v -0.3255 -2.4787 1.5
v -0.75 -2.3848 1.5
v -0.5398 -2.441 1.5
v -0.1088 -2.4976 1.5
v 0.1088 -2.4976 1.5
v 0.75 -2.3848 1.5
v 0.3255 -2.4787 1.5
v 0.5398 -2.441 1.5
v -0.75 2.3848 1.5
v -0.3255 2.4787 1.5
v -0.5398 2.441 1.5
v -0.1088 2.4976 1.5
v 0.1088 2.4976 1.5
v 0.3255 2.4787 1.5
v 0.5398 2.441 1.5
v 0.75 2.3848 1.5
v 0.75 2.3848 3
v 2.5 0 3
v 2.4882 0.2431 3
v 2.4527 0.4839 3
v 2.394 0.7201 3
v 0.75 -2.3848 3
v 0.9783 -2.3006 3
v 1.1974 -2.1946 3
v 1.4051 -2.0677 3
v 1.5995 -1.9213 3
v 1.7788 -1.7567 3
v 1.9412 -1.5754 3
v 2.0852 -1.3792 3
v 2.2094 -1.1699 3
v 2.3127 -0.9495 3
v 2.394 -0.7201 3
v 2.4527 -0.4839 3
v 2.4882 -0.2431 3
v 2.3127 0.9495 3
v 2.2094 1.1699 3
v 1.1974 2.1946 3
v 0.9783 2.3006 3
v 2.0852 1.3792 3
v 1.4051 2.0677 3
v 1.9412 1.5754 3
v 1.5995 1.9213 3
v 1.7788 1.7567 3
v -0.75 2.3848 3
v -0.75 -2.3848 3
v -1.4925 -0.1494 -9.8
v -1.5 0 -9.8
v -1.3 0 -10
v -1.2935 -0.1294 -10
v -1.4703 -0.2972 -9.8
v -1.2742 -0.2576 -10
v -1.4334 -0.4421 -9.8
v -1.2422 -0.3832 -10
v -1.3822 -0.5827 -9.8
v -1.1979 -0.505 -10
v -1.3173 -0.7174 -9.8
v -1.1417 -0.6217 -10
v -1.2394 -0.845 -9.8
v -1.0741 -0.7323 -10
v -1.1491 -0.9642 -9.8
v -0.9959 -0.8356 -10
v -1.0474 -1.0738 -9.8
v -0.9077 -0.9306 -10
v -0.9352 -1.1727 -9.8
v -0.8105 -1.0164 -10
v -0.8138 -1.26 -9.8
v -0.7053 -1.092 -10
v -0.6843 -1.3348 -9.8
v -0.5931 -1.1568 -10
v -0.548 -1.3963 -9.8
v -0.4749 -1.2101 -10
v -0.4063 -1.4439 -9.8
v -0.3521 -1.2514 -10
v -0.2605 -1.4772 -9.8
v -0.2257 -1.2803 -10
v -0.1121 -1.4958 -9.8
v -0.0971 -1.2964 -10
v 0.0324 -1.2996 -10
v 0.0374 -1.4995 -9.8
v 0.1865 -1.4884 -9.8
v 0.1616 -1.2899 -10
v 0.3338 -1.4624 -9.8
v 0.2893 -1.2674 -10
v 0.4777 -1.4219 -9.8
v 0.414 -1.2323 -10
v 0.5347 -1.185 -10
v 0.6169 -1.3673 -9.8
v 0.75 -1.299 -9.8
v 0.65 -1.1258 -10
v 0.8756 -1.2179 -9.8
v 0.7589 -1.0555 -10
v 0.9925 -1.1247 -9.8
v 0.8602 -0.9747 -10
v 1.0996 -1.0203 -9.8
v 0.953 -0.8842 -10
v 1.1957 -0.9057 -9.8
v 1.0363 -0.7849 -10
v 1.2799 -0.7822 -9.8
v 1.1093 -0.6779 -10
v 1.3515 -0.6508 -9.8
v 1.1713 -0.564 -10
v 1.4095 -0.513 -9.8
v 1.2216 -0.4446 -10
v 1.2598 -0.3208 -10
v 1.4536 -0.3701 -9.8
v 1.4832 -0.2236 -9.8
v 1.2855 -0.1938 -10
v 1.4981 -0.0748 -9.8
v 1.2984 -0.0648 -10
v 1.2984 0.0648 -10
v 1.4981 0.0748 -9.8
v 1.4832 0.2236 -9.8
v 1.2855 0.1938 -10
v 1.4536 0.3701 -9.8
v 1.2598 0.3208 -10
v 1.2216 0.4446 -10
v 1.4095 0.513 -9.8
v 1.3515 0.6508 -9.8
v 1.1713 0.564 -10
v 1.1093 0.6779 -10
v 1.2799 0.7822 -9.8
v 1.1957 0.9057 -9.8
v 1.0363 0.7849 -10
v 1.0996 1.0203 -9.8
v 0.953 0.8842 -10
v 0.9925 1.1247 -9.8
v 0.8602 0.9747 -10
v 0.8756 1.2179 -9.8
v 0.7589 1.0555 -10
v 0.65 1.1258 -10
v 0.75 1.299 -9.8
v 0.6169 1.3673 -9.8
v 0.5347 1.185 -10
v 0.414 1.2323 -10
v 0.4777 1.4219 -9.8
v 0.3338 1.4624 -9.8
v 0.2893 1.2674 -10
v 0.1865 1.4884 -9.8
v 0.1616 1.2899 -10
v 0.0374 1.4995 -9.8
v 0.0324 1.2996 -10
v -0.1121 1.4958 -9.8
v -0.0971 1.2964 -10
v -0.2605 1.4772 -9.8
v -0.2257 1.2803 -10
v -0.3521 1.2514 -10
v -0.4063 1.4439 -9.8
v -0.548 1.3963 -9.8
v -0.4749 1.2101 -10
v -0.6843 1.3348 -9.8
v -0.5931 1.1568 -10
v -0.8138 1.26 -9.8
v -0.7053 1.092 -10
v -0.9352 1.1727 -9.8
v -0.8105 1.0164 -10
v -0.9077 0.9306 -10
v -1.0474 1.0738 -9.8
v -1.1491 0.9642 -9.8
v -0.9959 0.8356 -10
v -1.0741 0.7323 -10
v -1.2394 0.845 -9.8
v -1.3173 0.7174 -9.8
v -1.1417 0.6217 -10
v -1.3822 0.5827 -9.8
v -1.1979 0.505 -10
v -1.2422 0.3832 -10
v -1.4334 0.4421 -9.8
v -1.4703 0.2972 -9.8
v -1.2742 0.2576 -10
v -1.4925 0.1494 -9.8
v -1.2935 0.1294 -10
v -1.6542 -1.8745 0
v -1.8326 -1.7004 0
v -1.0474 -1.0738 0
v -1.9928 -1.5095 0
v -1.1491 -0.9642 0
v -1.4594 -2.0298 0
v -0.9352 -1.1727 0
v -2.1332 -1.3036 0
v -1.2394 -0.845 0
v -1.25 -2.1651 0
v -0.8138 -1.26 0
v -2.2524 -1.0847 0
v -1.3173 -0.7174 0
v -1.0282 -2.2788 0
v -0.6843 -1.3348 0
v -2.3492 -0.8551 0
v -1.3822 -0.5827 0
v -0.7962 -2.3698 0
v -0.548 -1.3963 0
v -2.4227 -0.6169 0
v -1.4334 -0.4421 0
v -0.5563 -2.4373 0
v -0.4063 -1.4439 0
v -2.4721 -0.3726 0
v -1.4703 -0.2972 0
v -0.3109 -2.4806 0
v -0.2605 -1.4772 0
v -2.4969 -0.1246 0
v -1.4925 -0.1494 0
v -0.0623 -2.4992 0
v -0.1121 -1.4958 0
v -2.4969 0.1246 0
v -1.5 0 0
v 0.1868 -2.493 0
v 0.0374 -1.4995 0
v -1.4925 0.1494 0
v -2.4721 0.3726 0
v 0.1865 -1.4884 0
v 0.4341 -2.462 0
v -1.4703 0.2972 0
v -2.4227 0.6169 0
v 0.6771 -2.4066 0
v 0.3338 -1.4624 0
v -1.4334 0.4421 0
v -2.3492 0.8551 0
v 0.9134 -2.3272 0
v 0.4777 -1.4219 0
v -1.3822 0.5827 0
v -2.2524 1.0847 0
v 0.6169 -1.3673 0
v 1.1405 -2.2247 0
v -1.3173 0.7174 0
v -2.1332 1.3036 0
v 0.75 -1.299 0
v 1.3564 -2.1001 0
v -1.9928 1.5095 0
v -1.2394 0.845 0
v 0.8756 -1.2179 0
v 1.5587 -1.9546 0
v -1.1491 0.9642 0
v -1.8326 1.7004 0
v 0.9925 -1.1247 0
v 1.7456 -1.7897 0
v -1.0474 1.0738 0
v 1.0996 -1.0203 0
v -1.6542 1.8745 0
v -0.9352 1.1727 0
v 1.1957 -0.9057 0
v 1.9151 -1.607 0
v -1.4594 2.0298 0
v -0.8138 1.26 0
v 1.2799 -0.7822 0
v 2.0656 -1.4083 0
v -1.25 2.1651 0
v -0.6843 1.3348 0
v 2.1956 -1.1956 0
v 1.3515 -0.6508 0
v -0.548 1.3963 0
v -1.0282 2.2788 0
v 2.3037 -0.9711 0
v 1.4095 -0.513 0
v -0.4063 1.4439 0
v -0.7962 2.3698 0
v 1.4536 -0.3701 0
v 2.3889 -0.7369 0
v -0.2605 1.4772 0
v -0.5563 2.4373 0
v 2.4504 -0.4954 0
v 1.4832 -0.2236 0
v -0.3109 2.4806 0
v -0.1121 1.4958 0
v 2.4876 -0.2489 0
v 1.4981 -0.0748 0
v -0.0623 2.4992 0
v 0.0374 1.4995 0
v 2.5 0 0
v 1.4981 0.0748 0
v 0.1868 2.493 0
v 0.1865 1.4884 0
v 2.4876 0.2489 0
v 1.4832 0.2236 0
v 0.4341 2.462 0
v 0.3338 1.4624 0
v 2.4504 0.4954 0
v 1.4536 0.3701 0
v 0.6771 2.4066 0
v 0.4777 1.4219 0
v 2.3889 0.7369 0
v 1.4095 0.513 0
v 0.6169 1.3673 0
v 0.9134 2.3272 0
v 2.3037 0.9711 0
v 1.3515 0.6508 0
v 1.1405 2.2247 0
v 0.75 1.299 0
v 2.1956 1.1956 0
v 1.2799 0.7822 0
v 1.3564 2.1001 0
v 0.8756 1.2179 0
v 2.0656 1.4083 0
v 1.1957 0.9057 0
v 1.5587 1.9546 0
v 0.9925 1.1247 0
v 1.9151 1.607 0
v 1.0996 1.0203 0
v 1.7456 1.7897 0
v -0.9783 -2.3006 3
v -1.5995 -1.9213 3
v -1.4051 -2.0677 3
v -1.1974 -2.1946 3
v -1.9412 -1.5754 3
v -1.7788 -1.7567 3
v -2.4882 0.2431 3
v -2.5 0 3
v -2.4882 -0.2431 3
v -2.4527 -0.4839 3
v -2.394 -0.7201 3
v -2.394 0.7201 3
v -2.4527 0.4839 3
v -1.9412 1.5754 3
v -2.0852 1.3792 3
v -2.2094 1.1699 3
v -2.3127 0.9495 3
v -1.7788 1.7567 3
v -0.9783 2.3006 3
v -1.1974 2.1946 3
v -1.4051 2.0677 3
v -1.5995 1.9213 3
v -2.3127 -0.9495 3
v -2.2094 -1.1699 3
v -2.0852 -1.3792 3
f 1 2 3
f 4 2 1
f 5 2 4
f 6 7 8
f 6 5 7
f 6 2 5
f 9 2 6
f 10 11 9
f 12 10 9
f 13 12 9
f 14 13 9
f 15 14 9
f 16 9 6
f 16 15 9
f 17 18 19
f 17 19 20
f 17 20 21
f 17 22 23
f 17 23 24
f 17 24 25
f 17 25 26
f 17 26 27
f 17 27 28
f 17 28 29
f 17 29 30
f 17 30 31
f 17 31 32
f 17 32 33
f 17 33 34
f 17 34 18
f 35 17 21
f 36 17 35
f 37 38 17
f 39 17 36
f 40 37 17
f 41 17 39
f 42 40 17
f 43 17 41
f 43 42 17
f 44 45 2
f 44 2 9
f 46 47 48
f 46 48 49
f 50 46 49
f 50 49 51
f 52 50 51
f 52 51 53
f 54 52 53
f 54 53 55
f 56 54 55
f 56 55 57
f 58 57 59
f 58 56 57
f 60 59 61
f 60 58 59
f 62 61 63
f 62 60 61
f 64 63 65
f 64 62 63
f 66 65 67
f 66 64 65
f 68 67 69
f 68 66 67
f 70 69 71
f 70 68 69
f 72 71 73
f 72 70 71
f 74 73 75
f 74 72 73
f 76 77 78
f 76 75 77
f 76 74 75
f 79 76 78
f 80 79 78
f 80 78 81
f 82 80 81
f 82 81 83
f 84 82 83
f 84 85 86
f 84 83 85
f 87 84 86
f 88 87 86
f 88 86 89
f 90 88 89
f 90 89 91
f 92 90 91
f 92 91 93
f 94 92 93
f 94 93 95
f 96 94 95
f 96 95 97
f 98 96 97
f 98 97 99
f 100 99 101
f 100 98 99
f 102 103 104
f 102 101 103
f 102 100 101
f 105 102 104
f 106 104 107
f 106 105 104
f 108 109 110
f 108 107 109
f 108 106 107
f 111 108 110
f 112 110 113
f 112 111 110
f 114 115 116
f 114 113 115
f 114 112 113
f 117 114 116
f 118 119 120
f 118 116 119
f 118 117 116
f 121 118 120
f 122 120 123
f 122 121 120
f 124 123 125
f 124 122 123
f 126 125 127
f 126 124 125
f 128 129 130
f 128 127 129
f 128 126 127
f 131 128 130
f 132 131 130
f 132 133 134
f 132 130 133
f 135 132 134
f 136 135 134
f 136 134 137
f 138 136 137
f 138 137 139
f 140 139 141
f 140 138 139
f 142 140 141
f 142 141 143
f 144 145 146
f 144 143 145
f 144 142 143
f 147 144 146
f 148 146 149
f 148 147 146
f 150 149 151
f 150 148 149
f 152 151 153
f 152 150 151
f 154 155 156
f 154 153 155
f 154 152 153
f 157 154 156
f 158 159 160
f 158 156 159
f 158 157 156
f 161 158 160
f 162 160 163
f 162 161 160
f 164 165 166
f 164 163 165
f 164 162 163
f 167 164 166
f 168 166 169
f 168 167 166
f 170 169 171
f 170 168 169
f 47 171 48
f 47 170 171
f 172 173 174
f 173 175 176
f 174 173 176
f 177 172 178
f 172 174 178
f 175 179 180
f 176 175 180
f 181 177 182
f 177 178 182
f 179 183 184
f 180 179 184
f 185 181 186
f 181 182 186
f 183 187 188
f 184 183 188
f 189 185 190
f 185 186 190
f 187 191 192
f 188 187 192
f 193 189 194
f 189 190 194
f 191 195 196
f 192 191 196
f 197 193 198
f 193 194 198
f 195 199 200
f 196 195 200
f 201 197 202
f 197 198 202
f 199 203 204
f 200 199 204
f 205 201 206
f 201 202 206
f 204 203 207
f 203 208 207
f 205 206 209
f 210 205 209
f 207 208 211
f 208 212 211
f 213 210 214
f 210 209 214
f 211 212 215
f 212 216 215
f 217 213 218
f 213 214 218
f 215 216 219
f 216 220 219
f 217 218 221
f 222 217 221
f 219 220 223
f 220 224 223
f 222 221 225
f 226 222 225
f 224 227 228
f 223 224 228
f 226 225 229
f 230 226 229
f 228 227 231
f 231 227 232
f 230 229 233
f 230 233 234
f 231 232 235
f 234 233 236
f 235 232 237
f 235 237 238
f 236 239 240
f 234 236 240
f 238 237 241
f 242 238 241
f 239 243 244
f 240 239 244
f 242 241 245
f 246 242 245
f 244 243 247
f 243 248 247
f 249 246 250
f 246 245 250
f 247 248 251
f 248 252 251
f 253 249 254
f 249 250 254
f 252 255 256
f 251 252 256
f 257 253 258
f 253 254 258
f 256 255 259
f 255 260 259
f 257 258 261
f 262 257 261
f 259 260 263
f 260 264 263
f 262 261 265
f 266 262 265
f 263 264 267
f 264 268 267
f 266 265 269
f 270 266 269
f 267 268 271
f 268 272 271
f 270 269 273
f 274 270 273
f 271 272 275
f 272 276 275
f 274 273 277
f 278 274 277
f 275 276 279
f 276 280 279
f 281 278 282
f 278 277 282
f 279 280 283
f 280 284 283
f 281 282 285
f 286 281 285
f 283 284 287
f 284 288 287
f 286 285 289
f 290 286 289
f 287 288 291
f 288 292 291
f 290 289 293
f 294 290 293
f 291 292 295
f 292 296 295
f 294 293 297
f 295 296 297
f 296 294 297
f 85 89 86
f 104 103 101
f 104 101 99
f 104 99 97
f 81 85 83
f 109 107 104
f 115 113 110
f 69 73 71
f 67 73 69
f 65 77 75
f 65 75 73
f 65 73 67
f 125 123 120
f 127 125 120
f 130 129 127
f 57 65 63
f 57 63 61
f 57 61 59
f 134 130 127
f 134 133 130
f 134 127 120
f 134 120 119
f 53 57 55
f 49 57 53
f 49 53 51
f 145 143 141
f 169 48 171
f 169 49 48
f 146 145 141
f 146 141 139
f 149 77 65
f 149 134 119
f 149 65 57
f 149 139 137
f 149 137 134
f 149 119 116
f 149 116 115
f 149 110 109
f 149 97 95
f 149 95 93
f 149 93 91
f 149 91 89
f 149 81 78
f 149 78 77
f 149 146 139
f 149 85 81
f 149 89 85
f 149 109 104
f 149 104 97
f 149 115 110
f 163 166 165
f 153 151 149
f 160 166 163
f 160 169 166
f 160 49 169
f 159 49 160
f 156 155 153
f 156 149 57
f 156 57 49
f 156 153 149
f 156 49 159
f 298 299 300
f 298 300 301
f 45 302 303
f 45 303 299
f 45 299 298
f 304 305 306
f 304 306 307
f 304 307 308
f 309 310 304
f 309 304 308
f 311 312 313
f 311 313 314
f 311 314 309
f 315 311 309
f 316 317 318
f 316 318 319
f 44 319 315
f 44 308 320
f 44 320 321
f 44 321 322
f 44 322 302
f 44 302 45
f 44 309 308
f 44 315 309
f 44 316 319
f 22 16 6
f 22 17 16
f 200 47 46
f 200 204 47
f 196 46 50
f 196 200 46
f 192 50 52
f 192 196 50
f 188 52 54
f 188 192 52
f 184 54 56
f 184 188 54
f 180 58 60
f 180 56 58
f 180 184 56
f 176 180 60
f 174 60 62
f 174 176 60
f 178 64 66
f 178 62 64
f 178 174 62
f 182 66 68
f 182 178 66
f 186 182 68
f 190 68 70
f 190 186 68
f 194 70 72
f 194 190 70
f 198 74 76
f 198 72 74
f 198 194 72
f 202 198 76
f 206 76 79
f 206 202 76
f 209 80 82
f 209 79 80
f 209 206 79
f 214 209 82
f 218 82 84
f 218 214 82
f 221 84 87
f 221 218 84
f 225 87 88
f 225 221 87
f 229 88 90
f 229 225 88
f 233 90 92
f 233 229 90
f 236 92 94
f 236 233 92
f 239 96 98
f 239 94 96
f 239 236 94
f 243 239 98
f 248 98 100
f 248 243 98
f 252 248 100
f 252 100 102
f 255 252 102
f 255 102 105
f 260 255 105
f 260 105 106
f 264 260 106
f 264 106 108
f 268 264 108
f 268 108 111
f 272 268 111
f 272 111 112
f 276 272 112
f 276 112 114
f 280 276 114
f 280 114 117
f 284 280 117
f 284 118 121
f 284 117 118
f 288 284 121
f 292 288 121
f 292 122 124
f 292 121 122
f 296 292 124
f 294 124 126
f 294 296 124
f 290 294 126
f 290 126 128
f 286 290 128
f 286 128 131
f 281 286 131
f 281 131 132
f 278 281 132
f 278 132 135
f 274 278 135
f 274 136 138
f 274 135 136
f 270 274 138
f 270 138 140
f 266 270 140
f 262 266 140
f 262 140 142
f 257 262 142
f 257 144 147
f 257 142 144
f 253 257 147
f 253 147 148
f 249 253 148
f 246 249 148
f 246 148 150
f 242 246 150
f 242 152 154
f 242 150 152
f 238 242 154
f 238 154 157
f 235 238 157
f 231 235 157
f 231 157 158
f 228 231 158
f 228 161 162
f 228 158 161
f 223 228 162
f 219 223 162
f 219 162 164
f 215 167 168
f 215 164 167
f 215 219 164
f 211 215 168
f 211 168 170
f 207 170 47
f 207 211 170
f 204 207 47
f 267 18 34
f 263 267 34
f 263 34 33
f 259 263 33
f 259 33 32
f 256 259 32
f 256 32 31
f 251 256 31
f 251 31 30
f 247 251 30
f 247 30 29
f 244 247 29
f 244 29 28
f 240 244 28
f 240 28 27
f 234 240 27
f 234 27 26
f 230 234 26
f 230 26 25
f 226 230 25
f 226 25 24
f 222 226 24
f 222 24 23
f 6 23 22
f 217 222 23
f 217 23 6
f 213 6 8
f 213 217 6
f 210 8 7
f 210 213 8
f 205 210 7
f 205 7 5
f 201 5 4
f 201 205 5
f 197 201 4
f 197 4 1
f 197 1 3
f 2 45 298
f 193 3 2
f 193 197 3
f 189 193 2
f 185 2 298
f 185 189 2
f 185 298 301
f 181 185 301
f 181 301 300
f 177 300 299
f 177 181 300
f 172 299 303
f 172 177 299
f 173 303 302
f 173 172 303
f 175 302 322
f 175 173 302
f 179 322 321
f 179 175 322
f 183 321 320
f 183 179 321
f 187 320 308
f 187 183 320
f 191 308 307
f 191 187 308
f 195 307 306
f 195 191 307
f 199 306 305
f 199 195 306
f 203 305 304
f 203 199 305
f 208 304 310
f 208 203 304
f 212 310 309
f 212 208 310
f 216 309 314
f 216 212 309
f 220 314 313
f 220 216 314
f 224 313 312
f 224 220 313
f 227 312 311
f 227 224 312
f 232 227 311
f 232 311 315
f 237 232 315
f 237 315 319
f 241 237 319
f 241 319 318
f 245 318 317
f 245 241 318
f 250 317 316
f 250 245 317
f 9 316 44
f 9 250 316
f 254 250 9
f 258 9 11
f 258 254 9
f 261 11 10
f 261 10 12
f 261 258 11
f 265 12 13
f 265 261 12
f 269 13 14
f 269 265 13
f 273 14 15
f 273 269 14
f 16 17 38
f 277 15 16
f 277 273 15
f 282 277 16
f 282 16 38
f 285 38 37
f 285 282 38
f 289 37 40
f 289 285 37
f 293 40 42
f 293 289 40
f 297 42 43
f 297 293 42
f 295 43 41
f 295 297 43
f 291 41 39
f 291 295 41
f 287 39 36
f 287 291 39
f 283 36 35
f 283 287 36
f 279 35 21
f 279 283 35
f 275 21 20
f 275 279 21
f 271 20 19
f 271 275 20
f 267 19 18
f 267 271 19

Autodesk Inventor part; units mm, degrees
ref_plane "YZ Plane" through (0, 0, 0) normal (1, 0, 0) x (0, 1, 0)
ref_plane "XZ Plane" through (0, 0, 0) normal (0, 1, 0) x (-1, 0, 0)
ref_plane "XY Plane" through (0, 0, 0) normal (0, 0, 1) x (1, 0, 0)
sketch "草图1" plane through (0, 0, 0) normal (0, 0, 1) x (1, 0, 0)
  circle A0 centre (0, 0) radius 2.5
  dimension "d0" = 5
extrude "拉伸1" add sketch "草图1" along normal blind 3
sketch "草图2" plane through (0, 0, 3) normal (0, 0, 1) x (1, 0, 0)
  line L0 (-0.75, 2.5) -> (0.75, 2.5)
  line L1 (0.75, 2.5) -> (0.75, -2.5)
  line L2 (0.75, -2.5) -> (-0.75, -2.5)
  line L3 (-0.75, -2.5) -> (-0.75, 2.5)
  circle A0 centre (0, 0) radius 2.5 projected
  point P0 (0, 2.5)
  dimension "d3" = 1.5
extrude "拉伸2" cut sketch "草图2" against normal blind 1.5 contours L0 A0 L3 | L0 L1 A0 | A0 L1 L3 | A0 L2 L3 | L1 L2 A0
sketch "草图3" plane through (0, 0, 0) normal (0, 0, -1) x (-1, 0, 0)
  circle A0 centre (0, 0) radius 1.5
  dimension "d6" = 3
extrude "拉伸3" add sketch "草图3" along normal blind 10
thread "螺纹1" size "M3x0.5" class "6g" standard "ANSI Metric M Profile" full length
chamfer "倒角1" distance 0.2 angle 45 1 edges at (1.5, 0, -10)
properties part number "分离前导形片固定螺丝"
